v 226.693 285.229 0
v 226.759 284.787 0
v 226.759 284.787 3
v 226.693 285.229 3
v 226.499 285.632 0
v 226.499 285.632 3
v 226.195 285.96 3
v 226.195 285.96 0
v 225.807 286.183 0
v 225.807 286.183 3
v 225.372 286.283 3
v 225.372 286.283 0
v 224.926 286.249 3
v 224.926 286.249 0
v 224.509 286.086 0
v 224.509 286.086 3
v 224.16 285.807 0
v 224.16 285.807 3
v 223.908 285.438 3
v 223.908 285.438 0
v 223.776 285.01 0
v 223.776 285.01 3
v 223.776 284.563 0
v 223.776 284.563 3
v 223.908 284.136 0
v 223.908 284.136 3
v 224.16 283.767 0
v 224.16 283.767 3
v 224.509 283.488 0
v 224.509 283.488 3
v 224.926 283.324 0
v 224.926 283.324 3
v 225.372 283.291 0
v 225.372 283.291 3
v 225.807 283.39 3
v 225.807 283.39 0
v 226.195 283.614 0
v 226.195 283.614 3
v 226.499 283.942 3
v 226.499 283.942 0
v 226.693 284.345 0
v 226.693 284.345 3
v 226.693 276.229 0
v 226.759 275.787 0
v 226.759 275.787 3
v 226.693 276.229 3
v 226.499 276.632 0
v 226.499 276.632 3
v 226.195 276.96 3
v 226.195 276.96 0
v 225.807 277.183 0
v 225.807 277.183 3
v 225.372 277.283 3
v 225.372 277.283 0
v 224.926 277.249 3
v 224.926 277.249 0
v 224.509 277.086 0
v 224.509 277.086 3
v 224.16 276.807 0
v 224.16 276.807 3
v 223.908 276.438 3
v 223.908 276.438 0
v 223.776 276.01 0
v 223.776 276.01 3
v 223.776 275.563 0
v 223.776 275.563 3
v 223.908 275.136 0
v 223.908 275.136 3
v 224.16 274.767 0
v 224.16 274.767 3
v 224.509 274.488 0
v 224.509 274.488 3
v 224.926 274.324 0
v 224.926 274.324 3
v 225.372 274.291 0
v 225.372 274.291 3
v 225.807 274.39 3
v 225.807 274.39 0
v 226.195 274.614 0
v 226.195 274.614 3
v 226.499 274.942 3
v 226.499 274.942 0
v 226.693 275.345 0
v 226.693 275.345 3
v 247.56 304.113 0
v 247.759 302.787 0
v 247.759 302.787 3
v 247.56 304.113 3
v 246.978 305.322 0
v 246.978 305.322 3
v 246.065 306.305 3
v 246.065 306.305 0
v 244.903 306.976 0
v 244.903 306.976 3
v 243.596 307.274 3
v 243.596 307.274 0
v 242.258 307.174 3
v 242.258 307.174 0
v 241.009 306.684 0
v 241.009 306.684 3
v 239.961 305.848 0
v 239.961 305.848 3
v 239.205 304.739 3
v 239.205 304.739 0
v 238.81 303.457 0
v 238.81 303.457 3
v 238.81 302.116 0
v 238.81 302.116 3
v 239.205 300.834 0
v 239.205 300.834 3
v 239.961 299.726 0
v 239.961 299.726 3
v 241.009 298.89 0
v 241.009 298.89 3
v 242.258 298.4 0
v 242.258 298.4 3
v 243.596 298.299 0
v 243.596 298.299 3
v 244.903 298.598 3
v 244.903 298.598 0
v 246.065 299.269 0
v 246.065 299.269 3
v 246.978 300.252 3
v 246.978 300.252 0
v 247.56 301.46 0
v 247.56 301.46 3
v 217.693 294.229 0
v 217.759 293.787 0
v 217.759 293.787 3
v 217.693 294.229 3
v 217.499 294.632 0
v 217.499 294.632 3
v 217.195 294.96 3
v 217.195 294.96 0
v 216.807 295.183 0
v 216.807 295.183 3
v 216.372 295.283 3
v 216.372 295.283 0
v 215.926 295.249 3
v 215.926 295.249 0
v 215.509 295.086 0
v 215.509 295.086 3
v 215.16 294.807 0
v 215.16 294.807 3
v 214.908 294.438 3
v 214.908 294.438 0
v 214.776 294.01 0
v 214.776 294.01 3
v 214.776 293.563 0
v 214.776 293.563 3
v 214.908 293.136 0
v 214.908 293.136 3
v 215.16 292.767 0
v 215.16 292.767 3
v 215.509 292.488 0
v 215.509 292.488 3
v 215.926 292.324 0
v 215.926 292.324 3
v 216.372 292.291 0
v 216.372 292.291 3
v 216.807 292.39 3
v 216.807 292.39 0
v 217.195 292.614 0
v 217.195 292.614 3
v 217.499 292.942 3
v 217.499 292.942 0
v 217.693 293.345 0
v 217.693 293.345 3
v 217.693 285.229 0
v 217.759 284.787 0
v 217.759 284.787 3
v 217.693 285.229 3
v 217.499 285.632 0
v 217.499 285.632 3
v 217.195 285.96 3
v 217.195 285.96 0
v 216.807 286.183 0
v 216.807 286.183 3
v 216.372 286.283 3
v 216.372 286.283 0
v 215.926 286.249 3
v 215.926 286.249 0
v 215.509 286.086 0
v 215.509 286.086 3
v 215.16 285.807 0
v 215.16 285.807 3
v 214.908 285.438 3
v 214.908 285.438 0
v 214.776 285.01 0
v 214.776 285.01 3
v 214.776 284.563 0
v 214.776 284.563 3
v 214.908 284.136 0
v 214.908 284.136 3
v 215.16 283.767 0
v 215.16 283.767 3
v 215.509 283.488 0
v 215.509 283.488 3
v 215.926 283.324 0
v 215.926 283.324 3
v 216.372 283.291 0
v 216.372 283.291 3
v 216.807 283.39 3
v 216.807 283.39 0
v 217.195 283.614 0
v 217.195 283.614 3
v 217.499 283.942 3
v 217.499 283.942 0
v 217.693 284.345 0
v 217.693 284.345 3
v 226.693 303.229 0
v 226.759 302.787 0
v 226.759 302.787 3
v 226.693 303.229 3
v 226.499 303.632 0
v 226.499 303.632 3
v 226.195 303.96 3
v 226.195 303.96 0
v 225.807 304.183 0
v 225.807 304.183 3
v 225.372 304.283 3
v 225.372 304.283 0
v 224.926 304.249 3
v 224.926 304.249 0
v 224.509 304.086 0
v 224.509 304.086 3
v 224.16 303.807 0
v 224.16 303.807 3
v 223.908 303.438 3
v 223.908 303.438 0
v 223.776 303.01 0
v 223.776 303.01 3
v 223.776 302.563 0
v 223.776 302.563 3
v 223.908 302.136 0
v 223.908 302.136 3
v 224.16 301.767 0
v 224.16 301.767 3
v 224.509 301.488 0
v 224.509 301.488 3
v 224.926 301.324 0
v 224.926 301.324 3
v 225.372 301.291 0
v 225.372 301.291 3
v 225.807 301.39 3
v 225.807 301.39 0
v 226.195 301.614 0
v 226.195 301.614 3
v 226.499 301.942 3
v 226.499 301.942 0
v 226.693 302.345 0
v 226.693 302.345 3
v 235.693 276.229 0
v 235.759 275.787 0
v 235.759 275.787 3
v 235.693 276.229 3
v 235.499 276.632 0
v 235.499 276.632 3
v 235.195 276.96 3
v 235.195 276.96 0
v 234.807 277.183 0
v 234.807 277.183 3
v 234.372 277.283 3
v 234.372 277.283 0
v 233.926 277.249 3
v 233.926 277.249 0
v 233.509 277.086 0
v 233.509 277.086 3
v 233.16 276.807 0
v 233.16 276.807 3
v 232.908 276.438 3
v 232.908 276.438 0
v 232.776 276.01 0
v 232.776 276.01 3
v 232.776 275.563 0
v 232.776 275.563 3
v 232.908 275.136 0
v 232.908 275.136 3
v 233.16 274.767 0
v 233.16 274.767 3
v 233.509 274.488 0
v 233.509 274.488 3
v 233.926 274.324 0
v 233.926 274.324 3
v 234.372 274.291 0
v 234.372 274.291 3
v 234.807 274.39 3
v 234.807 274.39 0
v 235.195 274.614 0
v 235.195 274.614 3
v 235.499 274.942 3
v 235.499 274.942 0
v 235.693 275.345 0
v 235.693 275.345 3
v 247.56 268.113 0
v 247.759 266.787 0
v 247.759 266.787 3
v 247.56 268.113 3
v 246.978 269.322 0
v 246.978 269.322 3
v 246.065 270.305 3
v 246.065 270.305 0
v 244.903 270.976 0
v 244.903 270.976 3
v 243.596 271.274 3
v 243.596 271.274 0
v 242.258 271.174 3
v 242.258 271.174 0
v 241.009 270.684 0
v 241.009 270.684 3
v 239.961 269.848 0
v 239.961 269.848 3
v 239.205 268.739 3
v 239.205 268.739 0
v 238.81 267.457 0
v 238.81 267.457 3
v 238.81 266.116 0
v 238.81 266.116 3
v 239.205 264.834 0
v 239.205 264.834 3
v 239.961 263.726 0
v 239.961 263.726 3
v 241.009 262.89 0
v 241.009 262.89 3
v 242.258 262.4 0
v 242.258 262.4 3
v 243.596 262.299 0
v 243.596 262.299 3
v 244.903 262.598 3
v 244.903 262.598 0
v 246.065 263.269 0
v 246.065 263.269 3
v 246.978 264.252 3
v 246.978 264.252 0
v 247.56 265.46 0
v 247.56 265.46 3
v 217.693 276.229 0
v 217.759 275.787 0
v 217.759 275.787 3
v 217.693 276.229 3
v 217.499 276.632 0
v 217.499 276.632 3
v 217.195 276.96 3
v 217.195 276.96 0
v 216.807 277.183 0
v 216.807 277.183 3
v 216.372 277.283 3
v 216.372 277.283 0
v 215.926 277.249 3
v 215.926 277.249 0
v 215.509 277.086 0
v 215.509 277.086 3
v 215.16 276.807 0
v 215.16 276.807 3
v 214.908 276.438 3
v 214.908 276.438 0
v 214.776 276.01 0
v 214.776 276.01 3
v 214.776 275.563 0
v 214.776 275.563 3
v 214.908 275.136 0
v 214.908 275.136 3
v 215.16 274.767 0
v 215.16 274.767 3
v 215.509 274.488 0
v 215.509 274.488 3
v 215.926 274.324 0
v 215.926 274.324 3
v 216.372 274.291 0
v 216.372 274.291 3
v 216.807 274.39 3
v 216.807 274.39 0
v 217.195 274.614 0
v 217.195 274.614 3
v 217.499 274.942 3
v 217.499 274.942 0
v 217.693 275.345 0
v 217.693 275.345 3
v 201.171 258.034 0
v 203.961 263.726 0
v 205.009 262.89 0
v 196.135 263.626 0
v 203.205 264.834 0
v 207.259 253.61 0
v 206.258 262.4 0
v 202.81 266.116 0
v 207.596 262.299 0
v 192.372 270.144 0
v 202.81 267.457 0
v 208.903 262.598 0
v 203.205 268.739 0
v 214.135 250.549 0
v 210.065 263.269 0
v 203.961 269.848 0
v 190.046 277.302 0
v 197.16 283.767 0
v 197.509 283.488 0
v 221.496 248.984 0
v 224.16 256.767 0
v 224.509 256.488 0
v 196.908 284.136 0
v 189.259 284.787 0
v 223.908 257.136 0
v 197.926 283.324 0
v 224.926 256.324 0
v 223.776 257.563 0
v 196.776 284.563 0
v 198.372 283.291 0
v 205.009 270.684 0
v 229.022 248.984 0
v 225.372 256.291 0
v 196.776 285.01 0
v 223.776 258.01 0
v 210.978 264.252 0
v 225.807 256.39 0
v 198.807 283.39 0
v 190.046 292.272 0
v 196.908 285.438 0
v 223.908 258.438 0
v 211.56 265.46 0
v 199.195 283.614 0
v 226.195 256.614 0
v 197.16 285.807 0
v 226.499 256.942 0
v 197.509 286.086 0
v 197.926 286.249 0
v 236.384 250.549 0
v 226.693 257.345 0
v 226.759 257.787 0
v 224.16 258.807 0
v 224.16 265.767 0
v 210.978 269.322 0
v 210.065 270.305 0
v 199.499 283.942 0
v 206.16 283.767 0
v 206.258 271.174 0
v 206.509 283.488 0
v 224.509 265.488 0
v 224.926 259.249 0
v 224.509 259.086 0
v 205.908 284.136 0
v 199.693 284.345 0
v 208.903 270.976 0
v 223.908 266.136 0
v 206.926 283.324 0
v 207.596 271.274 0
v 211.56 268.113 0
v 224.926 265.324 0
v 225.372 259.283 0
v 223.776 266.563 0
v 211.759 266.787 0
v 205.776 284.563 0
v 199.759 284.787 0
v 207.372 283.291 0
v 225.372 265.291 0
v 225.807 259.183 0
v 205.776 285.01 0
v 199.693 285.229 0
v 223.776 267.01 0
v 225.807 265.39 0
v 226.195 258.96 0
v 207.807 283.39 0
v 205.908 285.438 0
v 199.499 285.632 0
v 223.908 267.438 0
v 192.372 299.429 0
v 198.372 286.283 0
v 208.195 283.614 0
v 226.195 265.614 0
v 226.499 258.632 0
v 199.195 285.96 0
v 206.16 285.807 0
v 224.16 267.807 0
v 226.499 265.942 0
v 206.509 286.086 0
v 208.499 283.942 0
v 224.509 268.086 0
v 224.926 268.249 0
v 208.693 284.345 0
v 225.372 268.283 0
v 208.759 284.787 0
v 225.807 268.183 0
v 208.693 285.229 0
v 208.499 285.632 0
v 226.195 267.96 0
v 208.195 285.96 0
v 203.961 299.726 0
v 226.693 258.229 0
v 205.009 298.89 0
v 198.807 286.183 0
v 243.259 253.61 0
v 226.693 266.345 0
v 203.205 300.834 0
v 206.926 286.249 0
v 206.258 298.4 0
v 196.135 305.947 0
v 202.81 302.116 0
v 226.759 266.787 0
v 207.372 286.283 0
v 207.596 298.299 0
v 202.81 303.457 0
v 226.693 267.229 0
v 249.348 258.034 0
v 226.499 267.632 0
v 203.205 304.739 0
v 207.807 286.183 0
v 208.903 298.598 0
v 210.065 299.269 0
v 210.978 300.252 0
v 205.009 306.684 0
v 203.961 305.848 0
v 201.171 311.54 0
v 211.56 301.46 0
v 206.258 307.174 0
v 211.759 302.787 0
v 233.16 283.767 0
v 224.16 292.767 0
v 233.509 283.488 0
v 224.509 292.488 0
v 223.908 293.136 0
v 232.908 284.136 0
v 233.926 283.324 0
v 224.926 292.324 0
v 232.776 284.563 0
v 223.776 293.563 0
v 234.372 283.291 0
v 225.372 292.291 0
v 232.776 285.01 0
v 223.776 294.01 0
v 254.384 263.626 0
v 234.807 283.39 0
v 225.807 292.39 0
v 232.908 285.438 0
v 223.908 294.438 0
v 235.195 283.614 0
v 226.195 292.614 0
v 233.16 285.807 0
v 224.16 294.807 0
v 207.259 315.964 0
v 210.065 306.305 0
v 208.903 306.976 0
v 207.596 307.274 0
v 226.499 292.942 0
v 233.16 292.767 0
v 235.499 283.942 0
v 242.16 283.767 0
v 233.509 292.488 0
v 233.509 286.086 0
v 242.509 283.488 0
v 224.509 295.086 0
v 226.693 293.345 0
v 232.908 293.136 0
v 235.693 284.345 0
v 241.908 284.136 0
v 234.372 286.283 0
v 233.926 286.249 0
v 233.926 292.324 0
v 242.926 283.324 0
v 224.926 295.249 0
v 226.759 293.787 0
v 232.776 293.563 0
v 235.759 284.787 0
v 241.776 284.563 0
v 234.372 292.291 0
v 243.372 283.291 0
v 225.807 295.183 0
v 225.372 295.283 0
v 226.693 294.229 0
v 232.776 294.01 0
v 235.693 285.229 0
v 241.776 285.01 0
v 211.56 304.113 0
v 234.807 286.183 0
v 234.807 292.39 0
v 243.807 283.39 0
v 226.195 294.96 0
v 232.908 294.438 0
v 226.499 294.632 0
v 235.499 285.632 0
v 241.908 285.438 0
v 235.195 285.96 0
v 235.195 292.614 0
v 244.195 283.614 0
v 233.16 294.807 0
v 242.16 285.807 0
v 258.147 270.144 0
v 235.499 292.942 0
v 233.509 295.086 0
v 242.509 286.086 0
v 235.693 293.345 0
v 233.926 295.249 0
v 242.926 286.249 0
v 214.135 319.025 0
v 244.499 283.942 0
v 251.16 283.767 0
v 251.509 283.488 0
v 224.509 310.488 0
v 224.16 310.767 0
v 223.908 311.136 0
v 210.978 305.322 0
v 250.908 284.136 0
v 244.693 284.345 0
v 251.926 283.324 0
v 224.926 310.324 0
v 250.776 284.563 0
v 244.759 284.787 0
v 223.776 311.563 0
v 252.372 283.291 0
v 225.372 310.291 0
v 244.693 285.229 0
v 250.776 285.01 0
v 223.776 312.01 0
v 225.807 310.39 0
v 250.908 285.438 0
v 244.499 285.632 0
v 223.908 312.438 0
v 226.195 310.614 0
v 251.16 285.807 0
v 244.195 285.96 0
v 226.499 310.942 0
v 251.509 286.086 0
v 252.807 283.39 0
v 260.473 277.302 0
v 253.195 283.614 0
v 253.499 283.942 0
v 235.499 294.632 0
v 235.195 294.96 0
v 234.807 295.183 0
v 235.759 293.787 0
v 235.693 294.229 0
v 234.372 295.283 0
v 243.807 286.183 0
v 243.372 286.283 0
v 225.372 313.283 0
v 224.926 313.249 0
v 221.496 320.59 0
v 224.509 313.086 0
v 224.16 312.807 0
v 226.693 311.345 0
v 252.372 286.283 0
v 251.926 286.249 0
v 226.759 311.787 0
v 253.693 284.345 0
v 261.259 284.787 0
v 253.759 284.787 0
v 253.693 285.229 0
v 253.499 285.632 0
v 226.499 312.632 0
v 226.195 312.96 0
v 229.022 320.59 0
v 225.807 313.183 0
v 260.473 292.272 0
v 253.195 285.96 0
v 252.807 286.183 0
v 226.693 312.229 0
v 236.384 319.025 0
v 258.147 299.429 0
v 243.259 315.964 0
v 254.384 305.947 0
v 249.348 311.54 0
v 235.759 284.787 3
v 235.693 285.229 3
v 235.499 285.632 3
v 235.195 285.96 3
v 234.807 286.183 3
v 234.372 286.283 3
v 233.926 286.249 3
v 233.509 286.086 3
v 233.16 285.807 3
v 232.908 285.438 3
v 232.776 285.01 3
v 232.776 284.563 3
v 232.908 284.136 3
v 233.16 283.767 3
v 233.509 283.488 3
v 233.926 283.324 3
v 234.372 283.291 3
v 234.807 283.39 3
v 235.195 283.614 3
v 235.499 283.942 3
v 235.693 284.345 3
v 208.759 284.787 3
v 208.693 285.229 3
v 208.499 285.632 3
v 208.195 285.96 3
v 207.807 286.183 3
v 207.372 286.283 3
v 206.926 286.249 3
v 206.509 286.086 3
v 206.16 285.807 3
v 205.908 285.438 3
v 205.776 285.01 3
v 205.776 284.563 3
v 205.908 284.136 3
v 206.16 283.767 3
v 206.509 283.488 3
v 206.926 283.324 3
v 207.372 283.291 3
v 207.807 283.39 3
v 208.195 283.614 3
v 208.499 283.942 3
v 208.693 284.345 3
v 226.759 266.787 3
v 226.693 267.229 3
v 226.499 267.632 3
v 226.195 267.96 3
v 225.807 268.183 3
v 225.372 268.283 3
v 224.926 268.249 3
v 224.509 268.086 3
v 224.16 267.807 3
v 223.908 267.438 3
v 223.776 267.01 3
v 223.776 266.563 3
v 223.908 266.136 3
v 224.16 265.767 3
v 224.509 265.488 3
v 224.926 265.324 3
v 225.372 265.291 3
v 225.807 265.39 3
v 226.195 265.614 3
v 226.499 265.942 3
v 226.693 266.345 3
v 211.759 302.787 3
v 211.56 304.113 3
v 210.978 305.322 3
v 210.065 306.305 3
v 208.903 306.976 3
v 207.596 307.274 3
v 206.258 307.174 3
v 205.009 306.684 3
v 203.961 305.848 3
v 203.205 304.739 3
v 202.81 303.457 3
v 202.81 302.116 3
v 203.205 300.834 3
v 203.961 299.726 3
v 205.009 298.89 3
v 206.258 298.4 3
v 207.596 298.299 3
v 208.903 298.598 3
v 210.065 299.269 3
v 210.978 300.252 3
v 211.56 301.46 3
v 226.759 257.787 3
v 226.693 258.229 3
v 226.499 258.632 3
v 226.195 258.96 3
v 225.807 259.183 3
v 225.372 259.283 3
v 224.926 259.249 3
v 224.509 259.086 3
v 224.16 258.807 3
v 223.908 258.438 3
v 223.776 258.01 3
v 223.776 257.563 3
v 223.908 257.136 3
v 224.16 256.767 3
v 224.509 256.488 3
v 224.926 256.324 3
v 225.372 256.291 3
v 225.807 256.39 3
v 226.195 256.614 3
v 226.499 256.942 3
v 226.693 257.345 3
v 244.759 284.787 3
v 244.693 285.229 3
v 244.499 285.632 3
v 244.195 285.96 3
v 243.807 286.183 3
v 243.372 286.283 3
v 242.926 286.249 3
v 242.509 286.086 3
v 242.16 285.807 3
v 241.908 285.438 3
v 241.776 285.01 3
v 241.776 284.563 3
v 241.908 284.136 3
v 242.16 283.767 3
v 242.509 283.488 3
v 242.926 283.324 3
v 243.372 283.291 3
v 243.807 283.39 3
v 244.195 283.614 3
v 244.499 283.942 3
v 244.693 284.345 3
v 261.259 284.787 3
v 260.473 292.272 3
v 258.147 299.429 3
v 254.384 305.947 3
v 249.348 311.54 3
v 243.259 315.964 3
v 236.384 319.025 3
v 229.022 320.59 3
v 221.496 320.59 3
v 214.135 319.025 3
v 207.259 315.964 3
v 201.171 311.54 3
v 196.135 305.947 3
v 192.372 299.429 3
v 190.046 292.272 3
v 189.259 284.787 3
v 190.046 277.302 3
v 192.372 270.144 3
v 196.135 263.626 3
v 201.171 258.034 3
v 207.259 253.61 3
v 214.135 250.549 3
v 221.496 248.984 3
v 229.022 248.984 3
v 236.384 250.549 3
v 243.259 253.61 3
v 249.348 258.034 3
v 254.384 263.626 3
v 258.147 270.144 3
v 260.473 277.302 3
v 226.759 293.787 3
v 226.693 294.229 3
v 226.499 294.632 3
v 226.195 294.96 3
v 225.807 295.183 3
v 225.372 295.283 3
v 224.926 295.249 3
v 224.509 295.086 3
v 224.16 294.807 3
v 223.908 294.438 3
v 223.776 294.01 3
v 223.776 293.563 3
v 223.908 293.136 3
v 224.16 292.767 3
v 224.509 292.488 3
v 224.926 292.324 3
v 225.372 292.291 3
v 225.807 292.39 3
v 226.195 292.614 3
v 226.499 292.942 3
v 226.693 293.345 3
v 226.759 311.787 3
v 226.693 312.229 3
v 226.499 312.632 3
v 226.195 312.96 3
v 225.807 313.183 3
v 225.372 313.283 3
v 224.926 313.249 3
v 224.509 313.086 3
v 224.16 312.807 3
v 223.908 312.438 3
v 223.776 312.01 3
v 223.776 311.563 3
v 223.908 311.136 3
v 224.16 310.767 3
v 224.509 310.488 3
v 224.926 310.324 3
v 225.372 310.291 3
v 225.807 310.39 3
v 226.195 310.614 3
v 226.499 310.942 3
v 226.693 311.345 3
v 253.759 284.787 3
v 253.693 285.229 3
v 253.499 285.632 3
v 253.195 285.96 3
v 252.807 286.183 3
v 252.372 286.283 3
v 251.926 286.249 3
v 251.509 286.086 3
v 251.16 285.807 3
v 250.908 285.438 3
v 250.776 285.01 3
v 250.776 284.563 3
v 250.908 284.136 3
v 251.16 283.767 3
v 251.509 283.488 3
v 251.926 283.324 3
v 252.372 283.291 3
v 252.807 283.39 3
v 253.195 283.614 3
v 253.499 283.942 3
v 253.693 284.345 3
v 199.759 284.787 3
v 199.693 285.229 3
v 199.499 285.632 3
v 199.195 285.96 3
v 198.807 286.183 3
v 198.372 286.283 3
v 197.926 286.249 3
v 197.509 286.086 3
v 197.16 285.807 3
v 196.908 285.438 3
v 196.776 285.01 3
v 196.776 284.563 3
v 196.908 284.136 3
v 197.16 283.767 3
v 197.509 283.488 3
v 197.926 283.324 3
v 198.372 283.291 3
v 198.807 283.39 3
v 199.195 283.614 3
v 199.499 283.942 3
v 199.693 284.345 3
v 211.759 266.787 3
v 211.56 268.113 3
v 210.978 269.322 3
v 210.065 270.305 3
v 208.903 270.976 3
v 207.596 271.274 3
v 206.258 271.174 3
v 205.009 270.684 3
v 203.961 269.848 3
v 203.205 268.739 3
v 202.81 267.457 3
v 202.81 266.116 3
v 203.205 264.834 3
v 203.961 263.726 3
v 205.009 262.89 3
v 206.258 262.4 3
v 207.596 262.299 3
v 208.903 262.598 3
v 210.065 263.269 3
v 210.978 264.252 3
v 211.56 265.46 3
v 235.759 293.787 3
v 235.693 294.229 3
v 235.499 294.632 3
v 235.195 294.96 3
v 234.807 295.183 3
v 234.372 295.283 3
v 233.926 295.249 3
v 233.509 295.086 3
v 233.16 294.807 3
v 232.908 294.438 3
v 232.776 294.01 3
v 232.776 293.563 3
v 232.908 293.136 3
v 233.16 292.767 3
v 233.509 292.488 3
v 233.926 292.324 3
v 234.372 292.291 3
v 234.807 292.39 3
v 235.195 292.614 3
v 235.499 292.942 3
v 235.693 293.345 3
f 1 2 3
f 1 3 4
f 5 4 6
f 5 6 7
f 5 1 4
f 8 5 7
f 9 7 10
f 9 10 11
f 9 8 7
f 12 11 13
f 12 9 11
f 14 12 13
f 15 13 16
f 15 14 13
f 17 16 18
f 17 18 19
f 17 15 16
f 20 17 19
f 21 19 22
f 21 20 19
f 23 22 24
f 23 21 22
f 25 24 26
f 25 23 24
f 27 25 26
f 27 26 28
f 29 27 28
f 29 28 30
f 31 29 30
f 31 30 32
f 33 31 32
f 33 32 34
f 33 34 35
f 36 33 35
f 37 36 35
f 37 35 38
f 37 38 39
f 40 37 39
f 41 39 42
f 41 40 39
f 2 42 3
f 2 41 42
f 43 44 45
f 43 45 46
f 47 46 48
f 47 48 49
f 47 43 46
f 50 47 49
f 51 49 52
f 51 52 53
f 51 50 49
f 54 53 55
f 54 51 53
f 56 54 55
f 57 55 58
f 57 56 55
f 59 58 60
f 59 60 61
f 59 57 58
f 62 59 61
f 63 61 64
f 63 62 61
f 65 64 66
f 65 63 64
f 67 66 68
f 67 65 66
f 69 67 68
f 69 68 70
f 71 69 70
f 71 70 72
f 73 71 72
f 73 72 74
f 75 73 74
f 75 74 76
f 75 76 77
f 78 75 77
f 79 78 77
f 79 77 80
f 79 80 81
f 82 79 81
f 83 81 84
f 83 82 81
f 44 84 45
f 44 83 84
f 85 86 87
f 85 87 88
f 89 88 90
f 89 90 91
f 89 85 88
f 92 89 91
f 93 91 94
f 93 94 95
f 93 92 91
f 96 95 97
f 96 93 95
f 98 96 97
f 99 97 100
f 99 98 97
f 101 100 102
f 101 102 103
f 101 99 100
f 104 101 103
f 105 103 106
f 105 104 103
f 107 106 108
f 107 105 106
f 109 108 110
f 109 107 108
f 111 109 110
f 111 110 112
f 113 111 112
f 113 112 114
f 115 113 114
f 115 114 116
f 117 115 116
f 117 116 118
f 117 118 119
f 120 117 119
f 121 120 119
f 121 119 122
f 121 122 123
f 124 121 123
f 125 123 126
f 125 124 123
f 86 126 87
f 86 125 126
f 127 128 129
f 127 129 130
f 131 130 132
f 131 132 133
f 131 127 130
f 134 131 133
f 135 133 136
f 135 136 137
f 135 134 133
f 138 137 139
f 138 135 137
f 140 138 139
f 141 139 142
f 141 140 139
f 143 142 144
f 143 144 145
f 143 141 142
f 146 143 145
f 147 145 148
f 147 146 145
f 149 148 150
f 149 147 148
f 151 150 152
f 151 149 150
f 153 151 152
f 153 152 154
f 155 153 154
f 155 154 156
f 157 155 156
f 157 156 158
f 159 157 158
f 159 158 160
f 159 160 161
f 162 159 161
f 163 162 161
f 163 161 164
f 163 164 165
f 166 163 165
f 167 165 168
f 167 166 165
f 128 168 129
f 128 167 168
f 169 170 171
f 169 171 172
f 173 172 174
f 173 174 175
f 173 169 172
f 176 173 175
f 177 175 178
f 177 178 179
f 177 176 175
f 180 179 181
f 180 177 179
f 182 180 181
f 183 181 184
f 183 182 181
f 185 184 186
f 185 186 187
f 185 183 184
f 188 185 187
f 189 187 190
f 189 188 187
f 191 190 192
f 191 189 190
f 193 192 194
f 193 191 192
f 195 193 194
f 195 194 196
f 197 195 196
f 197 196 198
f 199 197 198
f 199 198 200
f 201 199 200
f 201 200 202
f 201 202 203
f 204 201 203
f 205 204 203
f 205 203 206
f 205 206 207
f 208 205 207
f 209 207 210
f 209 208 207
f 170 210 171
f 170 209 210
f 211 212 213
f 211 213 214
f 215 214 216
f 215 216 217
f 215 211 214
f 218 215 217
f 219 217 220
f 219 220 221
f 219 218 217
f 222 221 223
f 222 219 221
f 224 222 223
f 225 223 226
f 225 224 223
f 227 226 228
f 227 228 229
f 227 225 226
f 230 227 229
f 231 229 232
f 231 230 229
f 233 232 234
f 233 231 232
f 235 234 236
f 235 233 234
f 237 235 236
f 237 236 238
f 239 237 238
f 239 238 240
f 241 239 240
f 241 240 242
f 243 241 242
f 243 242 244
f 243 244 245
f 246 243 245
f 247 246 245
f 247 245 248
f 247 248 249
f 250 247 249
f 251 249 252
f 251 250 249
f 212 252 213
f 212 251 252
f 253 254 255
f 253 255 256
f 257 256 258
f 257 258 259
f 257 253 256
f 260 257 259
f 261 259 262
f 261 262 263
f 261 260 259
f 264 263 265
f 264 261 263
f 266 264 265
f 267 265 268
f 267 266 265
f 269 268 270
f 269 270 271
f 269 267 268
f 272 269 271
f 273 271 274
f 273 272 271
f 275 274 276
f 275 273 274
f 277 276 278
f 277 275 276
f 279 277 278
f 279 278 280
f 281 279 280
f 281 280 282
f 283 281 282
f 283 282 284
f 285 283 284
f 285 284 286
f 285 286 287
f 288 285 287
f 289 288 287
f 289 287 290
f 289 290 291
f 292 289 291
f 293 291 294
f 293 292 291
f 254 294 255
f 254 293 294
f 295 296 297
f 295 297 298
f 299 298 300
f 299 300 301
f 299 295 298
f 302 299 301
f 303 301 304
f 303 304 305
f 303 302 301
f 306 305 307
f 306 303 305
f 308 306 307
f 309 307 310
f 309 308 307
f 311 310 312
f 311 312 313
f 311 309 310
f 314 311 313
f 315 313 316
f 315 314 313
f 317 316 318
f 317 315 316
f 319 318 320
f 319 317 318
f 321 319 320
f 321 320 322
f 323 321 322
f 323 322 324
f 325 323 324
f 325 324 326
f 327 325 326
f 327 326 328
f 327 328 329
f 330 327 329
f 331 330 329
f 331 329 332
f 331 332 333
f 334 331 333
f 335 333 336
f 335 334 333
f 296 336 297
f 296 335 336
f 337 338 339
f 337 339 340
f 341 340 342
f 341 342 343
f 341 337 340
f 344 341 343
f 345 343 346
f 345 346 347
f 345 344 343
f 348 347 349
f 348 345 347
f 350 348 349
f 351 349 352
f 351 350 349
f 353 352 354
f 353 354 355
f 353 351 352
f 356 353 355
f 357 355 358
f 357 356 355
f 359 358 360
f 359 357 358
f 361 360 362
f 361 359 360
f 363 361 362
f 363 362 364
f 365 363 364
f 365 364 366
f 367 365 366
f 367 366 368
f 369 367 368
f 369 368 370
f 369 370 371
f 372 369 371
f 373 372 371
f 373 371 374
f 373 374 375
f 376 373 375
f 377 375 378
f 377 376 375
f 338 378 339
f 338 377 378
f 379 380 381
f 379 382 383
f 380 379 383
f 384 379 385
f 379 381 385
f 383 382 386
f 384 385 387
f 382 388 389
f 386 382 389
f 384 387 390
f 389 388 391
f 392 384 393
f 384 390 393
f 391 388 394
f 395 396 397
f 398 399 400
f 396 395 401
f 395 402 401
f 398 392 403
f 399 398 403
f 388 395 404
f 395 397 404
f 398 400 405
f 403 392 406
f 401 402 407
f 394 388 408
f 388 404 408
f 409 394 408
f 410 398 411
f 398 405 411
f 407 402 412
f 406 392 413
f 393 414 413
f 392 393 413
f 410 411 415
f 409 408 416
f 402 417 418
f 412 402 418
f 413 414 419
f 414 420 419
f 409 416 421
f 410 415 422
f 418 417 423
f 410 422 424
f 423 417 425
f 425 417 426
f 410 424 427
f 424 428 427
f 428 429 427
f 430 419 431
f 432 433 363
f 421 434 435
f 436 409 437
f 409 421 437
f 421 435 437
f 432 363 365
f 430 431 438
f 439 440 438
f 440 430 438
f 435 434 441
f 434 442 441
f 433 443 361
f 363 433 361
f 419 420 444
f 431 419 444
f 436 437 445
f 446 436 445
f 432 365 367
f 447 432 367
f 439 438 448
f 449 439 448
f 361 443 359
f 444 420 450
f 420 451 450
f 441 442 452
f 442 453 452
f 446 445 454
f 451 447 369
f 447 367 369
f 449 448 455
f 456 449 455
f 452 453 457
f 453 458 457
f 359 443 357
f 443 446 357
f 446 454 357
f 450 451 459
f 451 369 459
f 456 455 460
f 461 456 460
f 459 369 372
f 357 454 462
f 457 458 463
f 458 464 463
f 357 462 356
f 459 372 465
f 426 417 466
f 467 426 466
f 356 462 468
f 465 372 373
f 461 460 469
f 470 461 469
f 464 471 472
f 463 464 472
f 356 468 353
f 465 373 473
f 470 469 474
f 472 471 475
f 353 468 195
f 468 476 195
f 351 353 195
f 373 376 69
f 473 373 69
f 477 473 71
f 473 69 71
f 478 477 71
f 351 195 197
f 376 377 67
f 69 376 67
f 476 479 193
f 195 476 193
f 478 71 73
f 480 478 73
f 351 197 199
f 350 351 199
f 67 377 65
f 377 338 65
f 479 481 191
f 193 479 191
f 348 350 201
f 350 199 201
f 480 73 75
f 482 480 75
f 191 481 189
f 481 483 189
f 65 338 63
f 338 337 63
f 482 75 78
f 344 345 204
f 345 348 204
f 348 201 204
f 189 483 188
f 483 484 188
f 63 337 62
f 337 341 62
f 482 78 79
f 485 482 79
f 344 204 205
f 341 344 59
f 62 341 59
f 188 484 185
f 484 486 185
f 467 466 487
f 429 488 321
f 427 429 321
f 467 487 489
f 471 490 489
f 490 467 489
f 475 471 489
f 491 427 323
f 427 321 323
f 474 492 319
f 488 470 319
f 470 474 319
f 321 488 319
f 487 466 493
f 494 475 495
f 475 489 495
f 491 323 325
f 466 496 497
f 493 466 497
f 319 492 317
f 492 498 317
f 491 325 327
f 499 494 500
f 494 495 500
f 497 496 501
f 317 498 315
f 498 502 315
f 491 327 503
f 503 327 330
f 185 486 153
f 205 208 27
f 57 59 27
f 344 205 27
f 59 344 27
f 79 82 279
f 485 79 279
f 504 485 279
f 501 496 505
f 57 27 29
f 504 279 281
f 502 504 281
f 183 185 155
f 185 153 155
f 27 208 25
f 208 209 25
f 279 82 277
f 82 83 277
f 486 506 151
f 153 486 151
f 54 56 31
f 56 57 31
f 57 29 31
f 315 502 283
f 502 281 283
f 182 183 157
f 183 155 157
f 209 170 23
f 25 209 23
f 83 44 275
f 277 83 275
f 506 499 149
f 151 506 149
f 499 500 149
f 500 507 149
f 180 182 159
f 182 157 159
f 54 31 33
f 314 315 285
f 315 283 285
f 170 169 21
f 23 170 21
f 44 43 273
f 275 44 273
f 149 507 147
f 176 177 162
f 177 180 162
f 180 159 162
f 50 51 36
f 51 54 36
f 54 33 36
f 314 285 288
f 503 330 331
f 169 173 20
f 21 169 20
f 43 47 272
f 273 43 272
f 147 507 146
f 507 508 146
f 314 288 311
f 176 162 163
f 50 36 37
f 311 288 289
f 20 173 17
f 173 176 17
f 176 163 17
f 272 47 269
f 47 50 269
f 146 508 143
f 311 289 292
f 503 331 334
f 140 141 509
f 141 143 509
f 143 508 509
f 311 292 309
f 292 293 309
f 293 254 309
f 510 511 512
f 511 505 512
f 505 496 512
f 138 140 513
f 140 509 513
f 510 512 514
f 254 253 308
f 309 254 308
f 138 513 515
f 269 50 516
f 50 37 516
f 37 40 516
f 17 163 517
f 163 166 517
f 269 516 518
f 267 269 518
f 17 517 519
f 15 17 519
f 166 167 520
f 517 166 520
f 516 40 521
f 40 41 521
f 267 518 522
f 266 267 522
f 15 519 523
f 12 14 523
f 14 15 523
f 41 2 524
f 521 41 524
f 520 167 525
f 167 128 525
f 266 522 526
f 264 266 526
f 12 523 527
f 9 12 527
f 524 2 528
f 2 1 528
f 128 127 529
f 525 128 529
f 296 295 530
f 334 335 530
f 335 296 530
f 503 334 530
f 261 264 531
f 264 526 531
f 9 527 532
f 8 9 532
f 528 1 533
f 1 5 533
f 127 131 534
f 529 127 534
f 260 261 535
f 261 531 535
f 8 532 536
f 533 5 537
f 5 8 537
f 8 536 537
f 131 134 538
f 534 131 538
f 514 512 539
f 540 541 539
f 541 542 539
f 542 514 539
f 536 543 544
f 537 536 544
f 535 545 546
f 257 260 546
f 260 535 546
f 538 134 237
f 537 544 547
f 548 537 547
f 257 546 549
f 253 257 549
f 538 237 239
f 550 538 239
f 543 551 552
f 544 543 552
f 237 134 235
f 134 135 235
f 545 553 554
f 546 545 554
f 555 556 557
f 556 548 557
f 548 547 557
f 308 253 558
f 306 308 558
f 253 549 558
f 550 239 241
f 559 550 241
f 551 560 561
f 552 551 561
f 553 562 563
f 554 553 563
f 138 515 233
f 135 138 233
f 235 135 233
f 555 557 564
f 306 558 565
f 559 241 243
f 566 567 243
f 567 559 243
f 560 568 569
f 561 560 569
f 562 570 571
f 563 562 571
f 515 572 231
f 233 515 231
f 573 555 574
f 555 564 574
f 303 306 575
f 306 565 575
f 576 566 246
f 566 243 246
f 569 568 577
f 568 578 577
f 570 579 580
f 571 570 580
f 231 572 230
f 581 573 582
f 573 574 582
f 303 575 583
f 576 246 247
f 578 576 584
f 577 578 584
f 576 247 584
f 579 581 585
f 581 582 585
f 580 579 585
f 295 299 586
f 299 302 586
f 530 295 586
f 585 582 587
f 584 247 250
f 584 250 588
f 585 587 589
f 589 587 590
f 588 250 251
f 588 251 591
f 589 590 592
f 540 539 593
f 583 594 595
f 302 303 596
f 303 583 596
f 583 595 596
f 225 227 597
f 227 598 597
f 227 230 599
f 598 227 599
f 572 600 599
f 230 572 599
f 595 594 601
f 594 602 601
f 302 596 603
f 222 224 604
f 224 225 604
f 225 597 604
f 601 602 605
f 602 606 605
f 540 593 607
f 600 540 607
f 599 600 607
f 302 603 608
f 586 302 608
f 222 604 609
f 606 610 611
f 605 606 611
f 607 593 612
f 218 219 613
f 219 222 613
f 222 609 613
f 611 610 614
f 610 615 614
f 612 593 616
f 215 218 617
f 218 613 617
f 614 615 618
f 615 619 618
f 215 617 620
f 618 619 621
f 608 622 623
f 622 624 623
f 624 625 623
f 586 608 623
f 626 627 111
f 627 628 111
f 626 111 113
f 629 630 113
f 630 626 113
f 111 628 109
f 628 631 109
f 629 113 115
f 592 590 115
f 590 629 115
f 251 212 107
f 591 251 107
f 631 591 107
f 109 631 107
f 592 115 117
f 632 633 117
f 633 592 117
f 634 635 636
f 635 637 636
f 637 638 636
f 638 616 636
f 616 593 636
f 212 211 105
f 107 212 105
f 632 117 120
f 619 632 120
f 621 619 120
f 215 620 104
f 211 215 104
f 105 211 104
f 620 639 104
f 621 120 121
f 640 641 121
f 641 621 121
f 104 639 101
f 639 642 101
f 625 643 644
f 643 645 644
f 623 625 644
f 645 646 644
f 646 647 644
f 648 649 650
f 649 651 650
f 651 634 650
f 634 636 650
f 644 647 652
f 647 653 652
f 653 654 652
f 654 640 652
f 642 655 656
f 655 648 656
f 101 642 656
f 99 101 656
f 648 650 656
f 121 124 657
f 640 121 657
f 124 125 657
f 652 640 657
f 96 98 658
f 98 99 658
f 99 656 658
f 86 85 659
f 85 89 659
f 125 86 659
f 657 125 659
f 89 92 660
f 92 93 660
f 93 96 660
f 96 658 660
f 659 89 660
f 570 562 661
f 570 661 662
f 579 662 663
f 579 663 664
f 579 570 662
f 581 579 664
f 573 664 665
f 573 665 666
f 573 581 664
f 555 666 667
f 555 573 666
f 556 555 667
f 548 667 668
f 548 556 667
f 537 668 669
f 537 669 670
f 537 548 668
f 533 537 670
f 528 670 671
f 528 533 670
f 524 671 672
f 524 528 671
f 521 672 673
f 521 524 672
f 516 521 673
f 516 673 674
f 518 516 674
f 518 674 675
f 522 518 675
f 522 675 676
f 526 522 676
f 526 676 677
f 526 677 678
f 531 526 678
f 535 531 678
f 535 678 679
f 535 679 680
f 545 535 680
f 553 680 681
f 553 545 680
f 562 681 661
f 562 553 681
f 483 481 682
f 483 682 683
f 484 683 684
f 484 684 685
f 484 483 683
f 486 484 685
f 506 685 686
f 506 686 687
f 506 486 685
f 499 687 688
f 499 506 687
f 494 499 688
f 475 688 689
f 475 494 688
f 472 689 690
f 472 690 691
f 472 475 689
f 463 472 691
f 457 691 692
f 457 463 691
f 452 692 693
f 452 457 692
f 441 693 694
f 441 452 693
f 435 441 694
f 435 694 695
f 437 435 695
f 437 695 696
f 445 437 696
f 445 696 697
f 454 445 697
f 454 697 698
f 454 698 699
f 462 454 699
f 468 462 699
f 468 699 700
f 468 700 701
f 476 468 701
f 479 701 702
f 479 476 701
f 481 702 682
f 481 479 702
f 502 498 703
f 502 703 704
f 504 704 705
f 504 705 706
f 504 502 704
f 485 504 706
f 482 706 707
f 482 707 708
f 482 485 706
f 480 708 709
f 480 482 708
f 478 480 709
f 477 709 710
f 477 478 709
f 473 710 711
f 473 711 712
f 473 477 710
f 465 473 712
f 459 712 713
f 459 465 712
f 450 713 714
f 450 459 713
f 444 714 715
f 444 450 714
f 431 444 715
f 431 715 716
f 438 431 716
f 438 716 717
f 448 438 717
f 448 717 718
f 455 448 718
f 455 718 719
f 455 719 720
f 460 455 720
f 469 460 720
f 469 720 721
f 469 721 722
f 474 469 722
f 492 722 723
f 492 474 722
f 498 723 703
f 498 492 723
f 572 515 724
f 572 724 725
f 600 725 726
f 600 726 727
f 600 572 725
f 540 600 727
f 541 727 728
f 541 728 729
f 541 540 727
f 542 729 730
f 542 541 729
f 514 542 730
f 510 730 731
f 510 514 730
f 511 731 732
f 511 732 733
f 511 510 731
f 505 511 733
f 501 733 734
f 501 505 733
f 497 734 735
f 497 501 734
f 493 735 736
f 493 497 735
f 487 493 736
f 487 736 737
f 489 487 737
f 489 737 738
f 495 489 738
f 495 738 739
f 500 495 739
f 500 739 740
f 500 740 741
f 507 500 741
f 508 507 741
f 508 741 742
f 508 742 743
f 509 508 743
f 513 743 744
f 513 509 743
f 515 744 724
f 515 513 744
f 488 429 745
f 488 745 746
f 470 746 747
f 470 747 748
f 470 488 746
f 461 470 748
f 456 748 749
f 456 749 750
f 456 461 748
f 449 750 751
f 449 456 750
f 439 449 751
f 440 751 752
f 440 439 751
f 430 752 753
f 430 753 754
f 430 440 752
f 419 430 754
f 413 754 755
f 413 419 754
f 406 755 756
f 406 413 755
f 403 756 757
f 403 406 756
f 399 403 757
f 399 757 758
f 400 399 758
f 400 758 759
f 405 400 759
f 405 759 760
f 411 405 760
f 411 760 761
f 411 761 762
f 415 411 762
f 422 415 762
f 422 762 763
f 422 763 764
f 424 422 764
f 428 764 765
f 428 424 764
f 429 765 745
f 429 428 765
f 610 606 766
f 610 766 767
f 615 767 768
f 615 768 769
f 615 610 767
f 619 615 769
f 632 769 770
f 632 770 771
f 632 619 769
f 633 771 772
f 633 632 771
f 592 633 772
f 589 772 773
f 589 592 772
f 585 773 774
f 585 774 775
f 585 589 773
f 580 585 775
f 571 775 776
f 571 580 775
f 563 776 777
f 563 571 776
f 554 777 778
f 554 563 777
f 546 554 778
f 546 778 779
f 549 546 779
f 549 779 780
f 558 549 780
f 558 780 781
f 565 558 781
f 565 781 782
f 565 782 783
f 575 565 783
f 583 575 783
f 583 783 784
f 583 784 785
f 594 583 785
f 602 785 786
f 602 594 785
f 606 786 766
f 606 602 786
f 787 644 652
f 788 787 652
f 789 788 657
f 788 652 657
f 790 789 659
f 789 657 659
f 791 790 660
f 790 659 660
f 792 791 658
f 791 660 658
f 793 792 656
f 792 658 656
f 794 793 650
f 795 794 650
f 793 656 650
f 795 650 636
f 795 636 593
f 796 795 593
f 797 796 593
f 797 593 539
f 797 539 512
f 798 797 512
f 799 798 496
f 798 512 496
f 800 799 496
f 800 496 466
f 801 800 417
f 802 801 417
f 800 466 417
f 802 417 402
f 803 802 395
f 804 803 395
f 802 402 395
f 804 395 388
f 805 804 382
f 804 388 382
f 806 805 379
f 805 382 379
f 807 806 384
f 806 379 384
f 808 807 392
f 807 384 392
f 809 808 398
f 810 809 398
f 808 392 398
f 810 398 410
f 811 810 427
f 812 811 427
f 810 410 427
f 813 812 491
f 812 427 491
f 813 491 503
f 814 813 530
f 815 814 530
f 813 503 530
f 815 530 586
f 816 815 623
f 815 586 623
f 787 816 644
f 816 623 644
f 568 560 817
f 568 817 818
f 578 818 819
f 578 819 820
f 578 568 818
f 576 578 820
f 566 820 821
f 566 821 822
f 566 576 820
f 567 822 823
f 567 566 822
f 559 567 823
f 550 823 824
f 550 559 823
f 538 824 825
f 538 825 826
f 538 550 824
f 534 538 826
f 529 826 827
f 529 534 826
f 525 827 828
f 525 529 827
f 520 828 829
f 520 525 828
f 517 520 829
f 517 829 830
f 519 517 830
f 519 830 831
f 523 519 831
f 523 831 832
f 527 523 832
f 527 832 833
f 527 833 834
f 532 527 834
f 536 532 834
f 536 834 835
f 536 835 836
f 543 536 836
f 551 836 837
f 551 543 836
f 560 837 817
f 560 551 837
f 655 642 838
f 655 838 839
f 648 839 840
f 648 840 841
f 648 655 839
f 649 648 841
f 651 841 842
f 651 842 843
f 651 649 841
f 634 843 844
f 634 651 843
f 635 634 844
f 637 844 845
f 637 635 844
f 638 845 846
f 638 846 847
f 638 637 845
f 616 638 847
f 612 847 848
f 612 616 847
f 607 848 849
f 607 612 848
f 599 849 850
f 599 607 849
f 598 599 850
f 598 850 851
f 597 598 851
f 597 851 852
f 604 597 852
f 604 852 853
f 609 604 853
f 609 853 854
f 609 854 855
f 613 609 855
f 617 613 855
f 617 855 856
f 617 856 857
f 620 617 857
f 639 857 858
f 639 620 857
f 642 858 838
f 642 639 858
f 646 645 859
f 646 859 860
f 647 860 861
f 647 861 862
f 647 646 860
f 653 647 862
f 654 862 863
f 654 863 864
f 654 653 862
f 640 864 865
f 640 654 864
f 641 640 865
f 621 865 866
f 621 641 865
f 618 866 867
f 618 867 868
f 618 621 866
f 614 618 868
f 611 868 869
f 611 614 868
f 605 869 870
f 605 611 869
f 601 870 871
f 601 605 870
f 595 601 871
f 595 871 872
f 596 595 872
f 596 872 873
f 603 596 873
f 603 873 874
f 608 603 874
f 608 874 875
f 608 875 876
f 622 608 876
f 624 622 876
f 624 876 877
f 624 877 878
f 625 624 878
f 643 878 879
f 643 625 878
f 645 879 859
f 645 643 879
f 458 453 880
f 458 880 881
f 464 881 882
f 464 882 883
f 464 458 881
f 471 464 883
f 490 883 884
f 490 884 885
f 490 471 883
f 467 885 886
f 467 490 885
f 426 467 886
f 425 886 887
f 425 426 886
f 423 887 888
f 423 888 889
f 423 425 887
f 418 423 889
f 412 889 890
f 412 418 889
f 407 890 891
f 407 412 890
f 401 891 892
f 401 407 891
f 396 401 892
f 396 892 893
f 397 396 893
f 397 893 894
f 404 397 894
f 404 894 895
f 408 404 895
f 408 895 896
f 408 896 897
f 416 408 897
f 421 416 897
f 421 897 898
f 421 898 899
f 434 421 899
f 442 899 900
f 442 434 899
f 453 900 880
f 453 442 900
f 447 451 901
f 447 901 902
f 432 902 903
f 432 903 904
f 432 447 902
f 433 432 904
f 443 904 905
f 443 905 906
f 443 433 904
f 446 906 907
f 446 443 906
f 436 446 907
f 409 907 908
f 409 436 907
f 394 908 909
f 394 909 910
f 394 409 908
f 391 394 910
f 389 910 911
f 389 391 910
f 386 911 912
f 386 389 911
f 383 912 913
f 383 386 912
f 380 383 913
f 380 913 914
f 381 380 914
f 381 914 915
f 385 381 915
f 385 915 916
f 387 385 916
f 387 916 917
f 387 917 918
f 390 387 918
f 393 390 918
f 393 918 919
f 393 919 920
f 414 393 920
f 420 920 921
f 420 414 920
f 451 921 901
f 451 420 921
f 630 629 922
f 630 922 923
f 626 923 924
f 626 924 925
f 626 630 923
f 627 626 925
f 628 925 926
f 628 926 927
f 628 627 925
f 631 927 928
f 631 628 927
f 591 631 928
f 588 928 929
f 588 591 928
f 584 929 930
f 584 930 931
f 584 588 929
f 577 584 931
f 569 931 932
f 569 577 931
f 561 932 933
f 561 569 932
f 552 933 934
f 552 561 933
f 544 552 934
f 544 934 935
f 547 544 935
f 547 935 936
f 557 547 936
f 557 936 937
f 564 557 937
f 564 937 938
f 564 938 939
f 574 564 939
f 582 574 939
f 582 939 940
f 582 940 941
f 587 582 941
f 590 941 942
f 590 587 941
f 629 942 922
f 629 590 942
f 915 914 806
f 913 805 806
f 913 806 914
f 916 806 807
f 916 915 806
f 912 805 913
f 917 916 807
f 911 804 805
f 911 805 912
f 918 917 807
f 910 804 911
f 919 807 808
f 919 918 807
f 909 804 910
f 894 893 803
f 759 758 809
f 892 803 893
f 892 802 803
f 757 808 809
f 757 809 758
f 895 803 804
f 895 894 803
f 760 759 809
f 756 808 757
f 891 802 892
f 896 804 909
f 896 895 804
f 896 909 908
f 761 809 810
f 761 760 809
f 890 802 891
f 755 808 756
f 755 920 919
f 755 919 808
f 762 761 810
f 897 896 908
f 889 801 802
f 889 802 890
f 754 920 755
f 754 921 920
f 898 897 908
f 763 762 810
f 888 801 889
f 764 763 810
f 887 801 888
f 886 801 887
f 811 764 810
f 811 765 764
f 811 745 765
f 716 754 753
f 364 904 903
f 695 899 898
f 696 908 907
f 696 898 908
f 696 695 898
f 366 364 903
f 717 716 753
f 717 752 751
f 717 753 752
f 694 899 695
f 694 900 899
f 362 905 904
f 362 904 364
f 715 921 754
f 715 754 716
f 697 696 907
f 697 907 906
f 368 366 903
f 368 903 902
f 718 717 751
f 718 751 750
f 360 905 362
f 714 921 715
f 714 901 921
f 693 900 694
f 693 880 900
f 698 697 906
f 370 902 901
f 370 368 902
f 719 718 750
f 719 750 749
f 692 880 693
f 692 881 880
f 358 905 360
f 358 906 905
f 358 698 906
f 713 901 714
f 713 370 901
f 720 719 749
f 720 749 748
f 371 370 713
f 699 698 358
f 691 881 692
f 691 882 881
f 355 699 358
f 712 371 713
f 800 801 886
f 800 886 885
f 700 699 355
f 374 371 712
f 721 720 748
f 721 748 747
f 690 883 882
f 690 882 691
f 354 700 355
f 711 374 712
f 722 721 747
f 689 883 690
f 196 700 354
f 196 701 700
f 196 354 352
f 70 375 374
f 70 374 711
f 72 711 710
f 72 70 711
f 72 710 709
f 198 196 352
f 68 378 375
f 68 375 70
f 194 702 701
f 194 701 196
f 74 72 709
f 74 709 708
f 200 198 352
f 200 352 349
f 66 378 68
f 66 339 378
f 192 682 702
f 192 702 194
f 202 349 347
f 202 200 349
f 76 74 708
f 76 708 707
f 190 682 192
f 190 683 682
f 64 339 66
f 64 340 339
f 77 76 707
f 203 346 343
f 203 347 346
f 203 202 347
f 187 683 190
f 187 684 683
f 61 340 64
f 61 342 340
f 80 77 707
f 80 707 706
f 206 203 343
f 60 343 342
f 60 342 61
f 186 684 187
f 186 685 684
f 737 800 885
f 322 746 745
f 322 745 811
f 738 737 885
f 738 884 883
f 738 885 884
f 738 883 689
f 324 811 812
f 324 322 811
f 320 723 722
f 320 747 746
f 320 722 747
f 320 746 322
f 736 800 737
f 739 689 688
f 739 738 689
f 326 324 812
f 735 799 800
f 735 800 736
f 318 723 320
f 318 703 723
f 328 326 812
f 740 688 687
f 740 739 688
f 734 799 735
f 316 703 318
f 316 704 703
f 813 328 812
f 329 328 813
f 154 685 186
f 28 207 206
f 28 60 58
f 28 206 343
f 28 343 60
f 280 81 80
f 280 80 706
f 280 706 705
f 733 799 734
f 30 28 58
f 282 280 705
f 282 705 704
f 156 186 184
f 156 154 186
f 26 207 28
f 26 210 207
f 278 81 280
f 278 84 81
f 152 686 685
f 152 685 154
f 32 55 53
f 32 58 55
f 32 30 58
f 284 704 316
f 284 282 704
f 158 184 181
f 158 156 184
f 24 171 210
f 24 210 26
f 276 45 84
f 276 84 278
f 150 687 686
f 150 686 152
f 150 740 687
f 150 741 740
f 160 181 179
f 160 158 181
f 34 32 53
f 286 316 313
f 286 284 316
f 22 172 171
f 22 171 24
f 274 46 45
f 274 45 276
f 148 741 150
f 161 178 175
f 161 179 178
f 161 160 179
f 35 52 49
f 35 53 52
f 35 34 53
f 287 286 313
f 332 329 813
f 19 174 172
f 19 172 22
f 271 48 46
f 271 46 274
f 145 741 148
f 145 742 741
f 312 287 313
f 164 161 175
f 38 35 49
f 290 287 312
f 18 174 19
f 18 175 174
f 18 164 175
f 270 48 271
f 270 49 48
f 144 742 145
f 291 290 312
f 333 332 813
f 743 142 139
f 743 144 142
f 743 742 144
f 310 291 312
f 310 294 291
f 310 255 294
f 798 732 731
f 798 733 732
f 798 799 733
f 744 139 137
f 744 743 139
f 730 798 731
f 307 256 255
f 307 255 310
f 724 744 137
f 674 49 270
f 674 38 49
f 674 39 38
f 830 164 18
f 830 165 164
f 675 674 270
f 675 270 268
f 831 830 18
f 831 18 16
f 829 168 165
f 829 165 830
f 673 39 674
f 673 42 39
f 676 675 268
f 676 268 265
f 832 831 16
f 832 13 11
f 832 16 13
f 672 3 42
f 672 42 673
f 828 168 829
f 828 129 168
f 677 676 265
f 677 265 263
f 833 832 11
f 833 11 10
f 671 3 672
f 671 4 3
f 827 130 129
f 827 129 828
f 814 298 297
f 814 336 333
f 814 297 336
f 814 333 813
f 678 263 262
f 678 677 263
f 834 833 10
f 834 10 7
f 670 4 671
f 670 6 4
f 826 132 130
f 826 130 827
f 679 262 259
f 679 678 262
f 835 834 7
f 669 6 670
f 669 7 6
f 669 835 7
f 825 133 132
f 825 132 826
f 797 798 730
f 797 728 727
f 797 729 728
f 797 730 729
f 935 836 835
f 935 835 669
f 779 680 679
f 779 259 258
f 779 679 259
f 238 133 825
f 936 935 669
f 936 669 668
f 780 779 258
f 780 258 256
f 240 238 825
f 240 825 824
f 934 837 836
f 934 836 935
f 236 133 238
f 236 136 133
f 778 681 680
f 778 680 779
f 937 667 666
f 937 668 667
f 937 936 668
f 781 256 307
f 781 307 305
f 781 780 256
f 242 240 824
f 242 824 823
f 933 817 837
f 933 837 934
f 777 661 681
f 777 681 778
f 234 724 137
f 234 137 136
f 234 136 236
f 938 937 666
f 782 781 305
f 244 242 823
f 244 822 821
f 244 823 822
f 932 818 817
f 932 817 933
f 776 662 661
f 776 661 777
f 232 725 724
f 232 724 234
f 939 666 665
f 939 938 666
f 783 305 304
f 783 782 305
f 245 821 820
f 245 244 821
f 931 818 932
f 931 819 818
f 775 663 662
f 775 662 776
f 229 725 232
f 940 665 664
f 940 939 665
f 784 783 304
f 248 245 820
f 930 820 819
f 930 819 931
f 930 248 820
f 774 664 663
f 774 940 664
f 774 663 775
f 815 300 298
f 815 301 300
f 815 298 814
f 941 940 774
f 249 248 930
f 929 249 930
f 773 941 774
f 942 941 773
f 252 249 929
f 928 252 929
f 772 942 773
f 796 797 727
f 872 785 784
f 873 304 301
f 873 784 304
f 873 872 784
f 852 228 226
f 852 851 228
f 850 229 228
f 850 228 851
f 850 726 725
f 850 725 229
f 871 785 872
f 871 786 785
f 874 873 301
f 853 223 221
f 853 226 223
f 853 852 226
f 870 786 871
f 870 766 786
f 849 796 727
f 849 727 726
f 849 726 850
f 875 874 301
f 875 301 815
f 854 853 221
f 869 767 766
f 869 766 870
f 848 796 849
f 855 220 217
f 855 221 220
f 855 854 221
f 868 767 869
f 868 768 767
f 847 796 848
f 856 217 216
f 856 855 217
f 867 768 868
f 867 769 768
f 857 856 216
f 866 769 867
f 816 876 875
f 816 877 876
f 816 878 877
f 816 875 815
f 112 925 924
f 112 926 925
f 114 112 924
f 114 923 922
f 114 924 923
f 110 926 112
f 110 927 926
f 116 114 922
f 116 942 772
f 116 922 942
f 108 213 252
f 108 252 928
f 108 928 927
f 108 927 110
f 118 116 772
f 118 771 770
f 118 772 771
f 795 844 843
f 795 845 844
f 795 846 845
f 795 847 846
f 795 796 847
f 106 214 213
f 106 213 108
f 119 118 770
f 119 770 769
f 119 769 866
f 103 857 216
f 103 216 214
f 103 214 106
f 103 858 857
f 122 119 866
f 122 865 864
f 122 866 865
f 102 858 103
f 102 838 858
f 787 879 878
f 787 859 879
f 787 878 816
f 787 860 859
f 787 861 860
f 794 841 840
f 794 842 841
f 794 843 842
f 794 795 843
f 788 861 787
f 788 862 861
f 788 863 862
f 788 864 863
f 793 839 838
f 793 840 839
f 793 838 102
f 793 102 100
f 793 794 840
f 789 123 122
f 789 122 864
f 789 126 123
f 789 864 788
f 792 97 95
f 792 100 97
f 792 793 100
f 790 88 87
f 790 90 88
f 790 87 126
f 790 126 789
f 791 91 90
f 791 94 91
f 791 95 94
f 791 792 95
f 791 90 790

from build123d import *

# Parameters (mm, degrees)
MODEL_R                 = 36
MODEL_R_2               = 4.5
MODEL_R_3               = 1.5
SALIENTE_EXTRUIR1_DEPTH = 3


with BuildPart() as part:
    # Model → Saliente-Extruir1 (new body)
    with BuildSketch(Plane.XY):
        with Locations((225.25945398, 284.786767066)):
            Circle(MODEL_R)
        with Locations((207.25945398, 302.786767066)):
            Circle(MODEL_R_2, mode=Mode.SUBTRACT)
        with Locations((207.25945398, 266.786767066)):
            Circle(MODEL_R_2, mode=Mode.SUBTRACT)
        with Locations((243.25945398, 266.786767066)):
            Circle(MODEL_R_2, mode=Mode.SUBTRACT)
        with Locations((243.25945398, 302.786767066)):
            Circle(MODEL_R_2, mode=Mode.SUBTRACT)
        with Locations((225.25945398, 284.786767066)):
            Circle(MODEL_R_3, mode=Mode.SUBTRACT)
        with Locations((225.25945398, 275.786767066)):
            Circle(MODEL_R_3, mode=Mode.SUBTRACT)
        with Locations((225.25945398, 293.786767066)):
            Circle(MODEL_R_3, mode=Mode.SUBTRACT)
        with Locations((234.25945398, 284.786767066)):
            Circle(MODEL_R_3, mode=Mode.SUBTRACT)
        with Locations((216.25945398, 284.786767066)):
            Circle(MODEL_R_3, mode=Mode.SUBTRACT)
        with Locations((243.25945398, 284.786767066)):
            Circle(MODEL_R_3, mode=Mode.SUBTRACT)
        with Locations((252.25945398, 284.786767066)):
            Circle(MODEL_R_3, mode=Mode.SUBTRACT)
        with Locations((198.25945398, 284.786767066)):
            Circle(MODEL_R_3, mode=Mode.SUBTRACT)
        with Locations((207.25945398, 284.786767066)):
            Circle(MODEL_R_3, mode=Mode.SUBTRACT)
        with Locations((225.25945398, 302.786767066)):
            Circle(MODEL_R_3, mode=Mode.SUBTRACT)
        with Locations((225.25945398, 311.786767066)):
            Circle(MODEL_R_3, mode=Mode.SUBTRACT)
        with Locations((225.25945398, 266.786767066)):
            Circle(MODEL_R_3, mode=Mode.SUBTRACT)
        with Locations((225.25945398, 257.786767066)):
            Circle(MODEL_R_3, mode=Mode.SUBTRACT)
        with Locations((216.25945398, 275.786767066)):
            Circle(MODEL_R_3, mode=Mode.SUBTRACT)
        with Locations((234.25945398, 293.786767066)):
            Circle(MODEL_R_3, mode=Mode.SUBTRACT)
        with Locations((234.25945398, 275.786767066)):
            Circle(MODEL_R_3, mode=Mode.SUBTRACT)
        with Locations((216.25945398, 293.786767066)):
            Circle(MODEL_R_3, mode=Mode.SUBTRACT)
    extrude(amount=SALIENTE_EXTRUIR1_DEPTH)


solid = part.part
